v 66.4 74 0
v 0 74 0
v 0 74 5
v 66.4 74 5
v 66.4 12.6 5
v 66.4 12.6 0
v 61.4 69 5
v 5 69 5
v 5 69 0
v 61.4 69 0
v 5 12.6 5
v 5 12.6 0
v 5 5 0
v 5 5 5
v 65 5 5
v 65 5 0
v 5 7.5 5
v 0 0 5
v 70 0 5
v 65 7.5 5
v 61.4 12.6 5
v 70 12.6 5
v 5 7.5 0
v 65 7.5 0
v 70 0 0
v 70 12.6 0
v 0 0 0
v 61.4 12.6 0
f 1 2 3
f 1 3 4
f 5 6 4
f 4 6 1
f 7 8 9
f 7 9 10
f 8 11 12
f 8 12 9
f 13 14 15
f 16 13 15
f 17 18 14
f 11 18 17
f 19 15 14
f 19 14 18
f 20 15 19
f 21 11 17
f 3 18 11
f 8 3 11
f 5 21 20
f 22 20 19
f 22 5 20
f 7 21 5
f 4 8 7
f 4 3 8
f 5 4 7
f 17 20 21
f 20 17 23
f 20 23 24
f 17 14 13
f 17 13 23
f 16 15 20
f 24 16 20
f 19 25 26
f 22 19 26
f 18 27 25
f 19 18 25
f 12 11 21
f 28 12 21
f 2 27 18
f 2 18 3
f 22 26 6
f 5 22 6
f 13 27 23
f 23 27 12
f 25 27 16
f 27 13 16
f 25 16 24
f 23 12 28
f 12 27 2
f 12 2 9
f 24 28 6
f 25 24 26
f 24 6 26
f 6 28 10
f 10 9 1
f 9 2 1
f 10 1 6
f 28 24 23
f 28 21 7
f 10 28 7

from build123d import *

# Parameters (mm, degrees)
SKETCH_1_W          = 70
SKETCH_1_H          = 74
EXTRUDE_1_DEPTH     = 5
CUT_EXTRUDE_2_REACH = 103.985
SKETCH_2_W          = 60
SKETCH_2_H          = 2.5
SKETCH_3_W          = 56.4
SKETCH_3_H          = 56.4
CUT_EXTRUDE_3_DEPTH = 20
SKETCH_4_W          = 3.6
SKETCH_4_H          = 61.4
CUT_EXTRUDE_5_DEPTH = 102.985293057


with BuildPart() as part:
    # Эскиз1 → Вытянуть1 (new body)
    with BuildSketch(Plane.XY):
        with Locations((35, 37)):
            Rectangle(SKETCH_1_W, SKETCH_1_H)
    extrude(amount=EXTRUDE_1_DEPTH)

    # Эскиз2 → Вытянуть2 (cut, up to next)
    with BuildSketch(Plane.XY.offset(5), mode=Mode.PRIVATE) as cut_extrude_2_sk1:
        with Locations((35, 6.25)):
            Rectangle(SKETCH_2_W, SKETCH_2_H)
    cut_extrude_2_tool1 = extrude(cut_extrude_2_sk1.sketch, amount=-CUT_EXTRUDE_2_REACH, mode=Mode.PRIVATE) & part.part
    add(cut_extrude_2_tool1.solids().sort_by_distance((35, 6.25, 5))[0], mode=Mode.SUBTRACT)

    # Эскиз3 → Вытянуть3 (cut)
    with BuildSketch(Plane.XY.offset(5)):
        with Locations((33.2, 40.8)):
            Rectangle(SKETCH_3_W, SKETCH_3_H)
    extrude(amount=-CUT_EXTRUDE_3_DEPTH, mode=Mode.SUBTRACT)

    # Эскиз4 → Вытянуть5 (cut, through all)
    with BuildSketch(Plane(origin=(0, 0, 0), x_dir=(-1, 0, 0), z_dir=(0, 0, -1))):
        with Locations((-68.2, 43.3)):
            Rectangle(SKETCH_4_W, SKETCH_4_H)
    extrude(amount=-CUT_EXTRUDE_5_DEPTH, mode=Mode.SUBTRACT)


solid = part.part
